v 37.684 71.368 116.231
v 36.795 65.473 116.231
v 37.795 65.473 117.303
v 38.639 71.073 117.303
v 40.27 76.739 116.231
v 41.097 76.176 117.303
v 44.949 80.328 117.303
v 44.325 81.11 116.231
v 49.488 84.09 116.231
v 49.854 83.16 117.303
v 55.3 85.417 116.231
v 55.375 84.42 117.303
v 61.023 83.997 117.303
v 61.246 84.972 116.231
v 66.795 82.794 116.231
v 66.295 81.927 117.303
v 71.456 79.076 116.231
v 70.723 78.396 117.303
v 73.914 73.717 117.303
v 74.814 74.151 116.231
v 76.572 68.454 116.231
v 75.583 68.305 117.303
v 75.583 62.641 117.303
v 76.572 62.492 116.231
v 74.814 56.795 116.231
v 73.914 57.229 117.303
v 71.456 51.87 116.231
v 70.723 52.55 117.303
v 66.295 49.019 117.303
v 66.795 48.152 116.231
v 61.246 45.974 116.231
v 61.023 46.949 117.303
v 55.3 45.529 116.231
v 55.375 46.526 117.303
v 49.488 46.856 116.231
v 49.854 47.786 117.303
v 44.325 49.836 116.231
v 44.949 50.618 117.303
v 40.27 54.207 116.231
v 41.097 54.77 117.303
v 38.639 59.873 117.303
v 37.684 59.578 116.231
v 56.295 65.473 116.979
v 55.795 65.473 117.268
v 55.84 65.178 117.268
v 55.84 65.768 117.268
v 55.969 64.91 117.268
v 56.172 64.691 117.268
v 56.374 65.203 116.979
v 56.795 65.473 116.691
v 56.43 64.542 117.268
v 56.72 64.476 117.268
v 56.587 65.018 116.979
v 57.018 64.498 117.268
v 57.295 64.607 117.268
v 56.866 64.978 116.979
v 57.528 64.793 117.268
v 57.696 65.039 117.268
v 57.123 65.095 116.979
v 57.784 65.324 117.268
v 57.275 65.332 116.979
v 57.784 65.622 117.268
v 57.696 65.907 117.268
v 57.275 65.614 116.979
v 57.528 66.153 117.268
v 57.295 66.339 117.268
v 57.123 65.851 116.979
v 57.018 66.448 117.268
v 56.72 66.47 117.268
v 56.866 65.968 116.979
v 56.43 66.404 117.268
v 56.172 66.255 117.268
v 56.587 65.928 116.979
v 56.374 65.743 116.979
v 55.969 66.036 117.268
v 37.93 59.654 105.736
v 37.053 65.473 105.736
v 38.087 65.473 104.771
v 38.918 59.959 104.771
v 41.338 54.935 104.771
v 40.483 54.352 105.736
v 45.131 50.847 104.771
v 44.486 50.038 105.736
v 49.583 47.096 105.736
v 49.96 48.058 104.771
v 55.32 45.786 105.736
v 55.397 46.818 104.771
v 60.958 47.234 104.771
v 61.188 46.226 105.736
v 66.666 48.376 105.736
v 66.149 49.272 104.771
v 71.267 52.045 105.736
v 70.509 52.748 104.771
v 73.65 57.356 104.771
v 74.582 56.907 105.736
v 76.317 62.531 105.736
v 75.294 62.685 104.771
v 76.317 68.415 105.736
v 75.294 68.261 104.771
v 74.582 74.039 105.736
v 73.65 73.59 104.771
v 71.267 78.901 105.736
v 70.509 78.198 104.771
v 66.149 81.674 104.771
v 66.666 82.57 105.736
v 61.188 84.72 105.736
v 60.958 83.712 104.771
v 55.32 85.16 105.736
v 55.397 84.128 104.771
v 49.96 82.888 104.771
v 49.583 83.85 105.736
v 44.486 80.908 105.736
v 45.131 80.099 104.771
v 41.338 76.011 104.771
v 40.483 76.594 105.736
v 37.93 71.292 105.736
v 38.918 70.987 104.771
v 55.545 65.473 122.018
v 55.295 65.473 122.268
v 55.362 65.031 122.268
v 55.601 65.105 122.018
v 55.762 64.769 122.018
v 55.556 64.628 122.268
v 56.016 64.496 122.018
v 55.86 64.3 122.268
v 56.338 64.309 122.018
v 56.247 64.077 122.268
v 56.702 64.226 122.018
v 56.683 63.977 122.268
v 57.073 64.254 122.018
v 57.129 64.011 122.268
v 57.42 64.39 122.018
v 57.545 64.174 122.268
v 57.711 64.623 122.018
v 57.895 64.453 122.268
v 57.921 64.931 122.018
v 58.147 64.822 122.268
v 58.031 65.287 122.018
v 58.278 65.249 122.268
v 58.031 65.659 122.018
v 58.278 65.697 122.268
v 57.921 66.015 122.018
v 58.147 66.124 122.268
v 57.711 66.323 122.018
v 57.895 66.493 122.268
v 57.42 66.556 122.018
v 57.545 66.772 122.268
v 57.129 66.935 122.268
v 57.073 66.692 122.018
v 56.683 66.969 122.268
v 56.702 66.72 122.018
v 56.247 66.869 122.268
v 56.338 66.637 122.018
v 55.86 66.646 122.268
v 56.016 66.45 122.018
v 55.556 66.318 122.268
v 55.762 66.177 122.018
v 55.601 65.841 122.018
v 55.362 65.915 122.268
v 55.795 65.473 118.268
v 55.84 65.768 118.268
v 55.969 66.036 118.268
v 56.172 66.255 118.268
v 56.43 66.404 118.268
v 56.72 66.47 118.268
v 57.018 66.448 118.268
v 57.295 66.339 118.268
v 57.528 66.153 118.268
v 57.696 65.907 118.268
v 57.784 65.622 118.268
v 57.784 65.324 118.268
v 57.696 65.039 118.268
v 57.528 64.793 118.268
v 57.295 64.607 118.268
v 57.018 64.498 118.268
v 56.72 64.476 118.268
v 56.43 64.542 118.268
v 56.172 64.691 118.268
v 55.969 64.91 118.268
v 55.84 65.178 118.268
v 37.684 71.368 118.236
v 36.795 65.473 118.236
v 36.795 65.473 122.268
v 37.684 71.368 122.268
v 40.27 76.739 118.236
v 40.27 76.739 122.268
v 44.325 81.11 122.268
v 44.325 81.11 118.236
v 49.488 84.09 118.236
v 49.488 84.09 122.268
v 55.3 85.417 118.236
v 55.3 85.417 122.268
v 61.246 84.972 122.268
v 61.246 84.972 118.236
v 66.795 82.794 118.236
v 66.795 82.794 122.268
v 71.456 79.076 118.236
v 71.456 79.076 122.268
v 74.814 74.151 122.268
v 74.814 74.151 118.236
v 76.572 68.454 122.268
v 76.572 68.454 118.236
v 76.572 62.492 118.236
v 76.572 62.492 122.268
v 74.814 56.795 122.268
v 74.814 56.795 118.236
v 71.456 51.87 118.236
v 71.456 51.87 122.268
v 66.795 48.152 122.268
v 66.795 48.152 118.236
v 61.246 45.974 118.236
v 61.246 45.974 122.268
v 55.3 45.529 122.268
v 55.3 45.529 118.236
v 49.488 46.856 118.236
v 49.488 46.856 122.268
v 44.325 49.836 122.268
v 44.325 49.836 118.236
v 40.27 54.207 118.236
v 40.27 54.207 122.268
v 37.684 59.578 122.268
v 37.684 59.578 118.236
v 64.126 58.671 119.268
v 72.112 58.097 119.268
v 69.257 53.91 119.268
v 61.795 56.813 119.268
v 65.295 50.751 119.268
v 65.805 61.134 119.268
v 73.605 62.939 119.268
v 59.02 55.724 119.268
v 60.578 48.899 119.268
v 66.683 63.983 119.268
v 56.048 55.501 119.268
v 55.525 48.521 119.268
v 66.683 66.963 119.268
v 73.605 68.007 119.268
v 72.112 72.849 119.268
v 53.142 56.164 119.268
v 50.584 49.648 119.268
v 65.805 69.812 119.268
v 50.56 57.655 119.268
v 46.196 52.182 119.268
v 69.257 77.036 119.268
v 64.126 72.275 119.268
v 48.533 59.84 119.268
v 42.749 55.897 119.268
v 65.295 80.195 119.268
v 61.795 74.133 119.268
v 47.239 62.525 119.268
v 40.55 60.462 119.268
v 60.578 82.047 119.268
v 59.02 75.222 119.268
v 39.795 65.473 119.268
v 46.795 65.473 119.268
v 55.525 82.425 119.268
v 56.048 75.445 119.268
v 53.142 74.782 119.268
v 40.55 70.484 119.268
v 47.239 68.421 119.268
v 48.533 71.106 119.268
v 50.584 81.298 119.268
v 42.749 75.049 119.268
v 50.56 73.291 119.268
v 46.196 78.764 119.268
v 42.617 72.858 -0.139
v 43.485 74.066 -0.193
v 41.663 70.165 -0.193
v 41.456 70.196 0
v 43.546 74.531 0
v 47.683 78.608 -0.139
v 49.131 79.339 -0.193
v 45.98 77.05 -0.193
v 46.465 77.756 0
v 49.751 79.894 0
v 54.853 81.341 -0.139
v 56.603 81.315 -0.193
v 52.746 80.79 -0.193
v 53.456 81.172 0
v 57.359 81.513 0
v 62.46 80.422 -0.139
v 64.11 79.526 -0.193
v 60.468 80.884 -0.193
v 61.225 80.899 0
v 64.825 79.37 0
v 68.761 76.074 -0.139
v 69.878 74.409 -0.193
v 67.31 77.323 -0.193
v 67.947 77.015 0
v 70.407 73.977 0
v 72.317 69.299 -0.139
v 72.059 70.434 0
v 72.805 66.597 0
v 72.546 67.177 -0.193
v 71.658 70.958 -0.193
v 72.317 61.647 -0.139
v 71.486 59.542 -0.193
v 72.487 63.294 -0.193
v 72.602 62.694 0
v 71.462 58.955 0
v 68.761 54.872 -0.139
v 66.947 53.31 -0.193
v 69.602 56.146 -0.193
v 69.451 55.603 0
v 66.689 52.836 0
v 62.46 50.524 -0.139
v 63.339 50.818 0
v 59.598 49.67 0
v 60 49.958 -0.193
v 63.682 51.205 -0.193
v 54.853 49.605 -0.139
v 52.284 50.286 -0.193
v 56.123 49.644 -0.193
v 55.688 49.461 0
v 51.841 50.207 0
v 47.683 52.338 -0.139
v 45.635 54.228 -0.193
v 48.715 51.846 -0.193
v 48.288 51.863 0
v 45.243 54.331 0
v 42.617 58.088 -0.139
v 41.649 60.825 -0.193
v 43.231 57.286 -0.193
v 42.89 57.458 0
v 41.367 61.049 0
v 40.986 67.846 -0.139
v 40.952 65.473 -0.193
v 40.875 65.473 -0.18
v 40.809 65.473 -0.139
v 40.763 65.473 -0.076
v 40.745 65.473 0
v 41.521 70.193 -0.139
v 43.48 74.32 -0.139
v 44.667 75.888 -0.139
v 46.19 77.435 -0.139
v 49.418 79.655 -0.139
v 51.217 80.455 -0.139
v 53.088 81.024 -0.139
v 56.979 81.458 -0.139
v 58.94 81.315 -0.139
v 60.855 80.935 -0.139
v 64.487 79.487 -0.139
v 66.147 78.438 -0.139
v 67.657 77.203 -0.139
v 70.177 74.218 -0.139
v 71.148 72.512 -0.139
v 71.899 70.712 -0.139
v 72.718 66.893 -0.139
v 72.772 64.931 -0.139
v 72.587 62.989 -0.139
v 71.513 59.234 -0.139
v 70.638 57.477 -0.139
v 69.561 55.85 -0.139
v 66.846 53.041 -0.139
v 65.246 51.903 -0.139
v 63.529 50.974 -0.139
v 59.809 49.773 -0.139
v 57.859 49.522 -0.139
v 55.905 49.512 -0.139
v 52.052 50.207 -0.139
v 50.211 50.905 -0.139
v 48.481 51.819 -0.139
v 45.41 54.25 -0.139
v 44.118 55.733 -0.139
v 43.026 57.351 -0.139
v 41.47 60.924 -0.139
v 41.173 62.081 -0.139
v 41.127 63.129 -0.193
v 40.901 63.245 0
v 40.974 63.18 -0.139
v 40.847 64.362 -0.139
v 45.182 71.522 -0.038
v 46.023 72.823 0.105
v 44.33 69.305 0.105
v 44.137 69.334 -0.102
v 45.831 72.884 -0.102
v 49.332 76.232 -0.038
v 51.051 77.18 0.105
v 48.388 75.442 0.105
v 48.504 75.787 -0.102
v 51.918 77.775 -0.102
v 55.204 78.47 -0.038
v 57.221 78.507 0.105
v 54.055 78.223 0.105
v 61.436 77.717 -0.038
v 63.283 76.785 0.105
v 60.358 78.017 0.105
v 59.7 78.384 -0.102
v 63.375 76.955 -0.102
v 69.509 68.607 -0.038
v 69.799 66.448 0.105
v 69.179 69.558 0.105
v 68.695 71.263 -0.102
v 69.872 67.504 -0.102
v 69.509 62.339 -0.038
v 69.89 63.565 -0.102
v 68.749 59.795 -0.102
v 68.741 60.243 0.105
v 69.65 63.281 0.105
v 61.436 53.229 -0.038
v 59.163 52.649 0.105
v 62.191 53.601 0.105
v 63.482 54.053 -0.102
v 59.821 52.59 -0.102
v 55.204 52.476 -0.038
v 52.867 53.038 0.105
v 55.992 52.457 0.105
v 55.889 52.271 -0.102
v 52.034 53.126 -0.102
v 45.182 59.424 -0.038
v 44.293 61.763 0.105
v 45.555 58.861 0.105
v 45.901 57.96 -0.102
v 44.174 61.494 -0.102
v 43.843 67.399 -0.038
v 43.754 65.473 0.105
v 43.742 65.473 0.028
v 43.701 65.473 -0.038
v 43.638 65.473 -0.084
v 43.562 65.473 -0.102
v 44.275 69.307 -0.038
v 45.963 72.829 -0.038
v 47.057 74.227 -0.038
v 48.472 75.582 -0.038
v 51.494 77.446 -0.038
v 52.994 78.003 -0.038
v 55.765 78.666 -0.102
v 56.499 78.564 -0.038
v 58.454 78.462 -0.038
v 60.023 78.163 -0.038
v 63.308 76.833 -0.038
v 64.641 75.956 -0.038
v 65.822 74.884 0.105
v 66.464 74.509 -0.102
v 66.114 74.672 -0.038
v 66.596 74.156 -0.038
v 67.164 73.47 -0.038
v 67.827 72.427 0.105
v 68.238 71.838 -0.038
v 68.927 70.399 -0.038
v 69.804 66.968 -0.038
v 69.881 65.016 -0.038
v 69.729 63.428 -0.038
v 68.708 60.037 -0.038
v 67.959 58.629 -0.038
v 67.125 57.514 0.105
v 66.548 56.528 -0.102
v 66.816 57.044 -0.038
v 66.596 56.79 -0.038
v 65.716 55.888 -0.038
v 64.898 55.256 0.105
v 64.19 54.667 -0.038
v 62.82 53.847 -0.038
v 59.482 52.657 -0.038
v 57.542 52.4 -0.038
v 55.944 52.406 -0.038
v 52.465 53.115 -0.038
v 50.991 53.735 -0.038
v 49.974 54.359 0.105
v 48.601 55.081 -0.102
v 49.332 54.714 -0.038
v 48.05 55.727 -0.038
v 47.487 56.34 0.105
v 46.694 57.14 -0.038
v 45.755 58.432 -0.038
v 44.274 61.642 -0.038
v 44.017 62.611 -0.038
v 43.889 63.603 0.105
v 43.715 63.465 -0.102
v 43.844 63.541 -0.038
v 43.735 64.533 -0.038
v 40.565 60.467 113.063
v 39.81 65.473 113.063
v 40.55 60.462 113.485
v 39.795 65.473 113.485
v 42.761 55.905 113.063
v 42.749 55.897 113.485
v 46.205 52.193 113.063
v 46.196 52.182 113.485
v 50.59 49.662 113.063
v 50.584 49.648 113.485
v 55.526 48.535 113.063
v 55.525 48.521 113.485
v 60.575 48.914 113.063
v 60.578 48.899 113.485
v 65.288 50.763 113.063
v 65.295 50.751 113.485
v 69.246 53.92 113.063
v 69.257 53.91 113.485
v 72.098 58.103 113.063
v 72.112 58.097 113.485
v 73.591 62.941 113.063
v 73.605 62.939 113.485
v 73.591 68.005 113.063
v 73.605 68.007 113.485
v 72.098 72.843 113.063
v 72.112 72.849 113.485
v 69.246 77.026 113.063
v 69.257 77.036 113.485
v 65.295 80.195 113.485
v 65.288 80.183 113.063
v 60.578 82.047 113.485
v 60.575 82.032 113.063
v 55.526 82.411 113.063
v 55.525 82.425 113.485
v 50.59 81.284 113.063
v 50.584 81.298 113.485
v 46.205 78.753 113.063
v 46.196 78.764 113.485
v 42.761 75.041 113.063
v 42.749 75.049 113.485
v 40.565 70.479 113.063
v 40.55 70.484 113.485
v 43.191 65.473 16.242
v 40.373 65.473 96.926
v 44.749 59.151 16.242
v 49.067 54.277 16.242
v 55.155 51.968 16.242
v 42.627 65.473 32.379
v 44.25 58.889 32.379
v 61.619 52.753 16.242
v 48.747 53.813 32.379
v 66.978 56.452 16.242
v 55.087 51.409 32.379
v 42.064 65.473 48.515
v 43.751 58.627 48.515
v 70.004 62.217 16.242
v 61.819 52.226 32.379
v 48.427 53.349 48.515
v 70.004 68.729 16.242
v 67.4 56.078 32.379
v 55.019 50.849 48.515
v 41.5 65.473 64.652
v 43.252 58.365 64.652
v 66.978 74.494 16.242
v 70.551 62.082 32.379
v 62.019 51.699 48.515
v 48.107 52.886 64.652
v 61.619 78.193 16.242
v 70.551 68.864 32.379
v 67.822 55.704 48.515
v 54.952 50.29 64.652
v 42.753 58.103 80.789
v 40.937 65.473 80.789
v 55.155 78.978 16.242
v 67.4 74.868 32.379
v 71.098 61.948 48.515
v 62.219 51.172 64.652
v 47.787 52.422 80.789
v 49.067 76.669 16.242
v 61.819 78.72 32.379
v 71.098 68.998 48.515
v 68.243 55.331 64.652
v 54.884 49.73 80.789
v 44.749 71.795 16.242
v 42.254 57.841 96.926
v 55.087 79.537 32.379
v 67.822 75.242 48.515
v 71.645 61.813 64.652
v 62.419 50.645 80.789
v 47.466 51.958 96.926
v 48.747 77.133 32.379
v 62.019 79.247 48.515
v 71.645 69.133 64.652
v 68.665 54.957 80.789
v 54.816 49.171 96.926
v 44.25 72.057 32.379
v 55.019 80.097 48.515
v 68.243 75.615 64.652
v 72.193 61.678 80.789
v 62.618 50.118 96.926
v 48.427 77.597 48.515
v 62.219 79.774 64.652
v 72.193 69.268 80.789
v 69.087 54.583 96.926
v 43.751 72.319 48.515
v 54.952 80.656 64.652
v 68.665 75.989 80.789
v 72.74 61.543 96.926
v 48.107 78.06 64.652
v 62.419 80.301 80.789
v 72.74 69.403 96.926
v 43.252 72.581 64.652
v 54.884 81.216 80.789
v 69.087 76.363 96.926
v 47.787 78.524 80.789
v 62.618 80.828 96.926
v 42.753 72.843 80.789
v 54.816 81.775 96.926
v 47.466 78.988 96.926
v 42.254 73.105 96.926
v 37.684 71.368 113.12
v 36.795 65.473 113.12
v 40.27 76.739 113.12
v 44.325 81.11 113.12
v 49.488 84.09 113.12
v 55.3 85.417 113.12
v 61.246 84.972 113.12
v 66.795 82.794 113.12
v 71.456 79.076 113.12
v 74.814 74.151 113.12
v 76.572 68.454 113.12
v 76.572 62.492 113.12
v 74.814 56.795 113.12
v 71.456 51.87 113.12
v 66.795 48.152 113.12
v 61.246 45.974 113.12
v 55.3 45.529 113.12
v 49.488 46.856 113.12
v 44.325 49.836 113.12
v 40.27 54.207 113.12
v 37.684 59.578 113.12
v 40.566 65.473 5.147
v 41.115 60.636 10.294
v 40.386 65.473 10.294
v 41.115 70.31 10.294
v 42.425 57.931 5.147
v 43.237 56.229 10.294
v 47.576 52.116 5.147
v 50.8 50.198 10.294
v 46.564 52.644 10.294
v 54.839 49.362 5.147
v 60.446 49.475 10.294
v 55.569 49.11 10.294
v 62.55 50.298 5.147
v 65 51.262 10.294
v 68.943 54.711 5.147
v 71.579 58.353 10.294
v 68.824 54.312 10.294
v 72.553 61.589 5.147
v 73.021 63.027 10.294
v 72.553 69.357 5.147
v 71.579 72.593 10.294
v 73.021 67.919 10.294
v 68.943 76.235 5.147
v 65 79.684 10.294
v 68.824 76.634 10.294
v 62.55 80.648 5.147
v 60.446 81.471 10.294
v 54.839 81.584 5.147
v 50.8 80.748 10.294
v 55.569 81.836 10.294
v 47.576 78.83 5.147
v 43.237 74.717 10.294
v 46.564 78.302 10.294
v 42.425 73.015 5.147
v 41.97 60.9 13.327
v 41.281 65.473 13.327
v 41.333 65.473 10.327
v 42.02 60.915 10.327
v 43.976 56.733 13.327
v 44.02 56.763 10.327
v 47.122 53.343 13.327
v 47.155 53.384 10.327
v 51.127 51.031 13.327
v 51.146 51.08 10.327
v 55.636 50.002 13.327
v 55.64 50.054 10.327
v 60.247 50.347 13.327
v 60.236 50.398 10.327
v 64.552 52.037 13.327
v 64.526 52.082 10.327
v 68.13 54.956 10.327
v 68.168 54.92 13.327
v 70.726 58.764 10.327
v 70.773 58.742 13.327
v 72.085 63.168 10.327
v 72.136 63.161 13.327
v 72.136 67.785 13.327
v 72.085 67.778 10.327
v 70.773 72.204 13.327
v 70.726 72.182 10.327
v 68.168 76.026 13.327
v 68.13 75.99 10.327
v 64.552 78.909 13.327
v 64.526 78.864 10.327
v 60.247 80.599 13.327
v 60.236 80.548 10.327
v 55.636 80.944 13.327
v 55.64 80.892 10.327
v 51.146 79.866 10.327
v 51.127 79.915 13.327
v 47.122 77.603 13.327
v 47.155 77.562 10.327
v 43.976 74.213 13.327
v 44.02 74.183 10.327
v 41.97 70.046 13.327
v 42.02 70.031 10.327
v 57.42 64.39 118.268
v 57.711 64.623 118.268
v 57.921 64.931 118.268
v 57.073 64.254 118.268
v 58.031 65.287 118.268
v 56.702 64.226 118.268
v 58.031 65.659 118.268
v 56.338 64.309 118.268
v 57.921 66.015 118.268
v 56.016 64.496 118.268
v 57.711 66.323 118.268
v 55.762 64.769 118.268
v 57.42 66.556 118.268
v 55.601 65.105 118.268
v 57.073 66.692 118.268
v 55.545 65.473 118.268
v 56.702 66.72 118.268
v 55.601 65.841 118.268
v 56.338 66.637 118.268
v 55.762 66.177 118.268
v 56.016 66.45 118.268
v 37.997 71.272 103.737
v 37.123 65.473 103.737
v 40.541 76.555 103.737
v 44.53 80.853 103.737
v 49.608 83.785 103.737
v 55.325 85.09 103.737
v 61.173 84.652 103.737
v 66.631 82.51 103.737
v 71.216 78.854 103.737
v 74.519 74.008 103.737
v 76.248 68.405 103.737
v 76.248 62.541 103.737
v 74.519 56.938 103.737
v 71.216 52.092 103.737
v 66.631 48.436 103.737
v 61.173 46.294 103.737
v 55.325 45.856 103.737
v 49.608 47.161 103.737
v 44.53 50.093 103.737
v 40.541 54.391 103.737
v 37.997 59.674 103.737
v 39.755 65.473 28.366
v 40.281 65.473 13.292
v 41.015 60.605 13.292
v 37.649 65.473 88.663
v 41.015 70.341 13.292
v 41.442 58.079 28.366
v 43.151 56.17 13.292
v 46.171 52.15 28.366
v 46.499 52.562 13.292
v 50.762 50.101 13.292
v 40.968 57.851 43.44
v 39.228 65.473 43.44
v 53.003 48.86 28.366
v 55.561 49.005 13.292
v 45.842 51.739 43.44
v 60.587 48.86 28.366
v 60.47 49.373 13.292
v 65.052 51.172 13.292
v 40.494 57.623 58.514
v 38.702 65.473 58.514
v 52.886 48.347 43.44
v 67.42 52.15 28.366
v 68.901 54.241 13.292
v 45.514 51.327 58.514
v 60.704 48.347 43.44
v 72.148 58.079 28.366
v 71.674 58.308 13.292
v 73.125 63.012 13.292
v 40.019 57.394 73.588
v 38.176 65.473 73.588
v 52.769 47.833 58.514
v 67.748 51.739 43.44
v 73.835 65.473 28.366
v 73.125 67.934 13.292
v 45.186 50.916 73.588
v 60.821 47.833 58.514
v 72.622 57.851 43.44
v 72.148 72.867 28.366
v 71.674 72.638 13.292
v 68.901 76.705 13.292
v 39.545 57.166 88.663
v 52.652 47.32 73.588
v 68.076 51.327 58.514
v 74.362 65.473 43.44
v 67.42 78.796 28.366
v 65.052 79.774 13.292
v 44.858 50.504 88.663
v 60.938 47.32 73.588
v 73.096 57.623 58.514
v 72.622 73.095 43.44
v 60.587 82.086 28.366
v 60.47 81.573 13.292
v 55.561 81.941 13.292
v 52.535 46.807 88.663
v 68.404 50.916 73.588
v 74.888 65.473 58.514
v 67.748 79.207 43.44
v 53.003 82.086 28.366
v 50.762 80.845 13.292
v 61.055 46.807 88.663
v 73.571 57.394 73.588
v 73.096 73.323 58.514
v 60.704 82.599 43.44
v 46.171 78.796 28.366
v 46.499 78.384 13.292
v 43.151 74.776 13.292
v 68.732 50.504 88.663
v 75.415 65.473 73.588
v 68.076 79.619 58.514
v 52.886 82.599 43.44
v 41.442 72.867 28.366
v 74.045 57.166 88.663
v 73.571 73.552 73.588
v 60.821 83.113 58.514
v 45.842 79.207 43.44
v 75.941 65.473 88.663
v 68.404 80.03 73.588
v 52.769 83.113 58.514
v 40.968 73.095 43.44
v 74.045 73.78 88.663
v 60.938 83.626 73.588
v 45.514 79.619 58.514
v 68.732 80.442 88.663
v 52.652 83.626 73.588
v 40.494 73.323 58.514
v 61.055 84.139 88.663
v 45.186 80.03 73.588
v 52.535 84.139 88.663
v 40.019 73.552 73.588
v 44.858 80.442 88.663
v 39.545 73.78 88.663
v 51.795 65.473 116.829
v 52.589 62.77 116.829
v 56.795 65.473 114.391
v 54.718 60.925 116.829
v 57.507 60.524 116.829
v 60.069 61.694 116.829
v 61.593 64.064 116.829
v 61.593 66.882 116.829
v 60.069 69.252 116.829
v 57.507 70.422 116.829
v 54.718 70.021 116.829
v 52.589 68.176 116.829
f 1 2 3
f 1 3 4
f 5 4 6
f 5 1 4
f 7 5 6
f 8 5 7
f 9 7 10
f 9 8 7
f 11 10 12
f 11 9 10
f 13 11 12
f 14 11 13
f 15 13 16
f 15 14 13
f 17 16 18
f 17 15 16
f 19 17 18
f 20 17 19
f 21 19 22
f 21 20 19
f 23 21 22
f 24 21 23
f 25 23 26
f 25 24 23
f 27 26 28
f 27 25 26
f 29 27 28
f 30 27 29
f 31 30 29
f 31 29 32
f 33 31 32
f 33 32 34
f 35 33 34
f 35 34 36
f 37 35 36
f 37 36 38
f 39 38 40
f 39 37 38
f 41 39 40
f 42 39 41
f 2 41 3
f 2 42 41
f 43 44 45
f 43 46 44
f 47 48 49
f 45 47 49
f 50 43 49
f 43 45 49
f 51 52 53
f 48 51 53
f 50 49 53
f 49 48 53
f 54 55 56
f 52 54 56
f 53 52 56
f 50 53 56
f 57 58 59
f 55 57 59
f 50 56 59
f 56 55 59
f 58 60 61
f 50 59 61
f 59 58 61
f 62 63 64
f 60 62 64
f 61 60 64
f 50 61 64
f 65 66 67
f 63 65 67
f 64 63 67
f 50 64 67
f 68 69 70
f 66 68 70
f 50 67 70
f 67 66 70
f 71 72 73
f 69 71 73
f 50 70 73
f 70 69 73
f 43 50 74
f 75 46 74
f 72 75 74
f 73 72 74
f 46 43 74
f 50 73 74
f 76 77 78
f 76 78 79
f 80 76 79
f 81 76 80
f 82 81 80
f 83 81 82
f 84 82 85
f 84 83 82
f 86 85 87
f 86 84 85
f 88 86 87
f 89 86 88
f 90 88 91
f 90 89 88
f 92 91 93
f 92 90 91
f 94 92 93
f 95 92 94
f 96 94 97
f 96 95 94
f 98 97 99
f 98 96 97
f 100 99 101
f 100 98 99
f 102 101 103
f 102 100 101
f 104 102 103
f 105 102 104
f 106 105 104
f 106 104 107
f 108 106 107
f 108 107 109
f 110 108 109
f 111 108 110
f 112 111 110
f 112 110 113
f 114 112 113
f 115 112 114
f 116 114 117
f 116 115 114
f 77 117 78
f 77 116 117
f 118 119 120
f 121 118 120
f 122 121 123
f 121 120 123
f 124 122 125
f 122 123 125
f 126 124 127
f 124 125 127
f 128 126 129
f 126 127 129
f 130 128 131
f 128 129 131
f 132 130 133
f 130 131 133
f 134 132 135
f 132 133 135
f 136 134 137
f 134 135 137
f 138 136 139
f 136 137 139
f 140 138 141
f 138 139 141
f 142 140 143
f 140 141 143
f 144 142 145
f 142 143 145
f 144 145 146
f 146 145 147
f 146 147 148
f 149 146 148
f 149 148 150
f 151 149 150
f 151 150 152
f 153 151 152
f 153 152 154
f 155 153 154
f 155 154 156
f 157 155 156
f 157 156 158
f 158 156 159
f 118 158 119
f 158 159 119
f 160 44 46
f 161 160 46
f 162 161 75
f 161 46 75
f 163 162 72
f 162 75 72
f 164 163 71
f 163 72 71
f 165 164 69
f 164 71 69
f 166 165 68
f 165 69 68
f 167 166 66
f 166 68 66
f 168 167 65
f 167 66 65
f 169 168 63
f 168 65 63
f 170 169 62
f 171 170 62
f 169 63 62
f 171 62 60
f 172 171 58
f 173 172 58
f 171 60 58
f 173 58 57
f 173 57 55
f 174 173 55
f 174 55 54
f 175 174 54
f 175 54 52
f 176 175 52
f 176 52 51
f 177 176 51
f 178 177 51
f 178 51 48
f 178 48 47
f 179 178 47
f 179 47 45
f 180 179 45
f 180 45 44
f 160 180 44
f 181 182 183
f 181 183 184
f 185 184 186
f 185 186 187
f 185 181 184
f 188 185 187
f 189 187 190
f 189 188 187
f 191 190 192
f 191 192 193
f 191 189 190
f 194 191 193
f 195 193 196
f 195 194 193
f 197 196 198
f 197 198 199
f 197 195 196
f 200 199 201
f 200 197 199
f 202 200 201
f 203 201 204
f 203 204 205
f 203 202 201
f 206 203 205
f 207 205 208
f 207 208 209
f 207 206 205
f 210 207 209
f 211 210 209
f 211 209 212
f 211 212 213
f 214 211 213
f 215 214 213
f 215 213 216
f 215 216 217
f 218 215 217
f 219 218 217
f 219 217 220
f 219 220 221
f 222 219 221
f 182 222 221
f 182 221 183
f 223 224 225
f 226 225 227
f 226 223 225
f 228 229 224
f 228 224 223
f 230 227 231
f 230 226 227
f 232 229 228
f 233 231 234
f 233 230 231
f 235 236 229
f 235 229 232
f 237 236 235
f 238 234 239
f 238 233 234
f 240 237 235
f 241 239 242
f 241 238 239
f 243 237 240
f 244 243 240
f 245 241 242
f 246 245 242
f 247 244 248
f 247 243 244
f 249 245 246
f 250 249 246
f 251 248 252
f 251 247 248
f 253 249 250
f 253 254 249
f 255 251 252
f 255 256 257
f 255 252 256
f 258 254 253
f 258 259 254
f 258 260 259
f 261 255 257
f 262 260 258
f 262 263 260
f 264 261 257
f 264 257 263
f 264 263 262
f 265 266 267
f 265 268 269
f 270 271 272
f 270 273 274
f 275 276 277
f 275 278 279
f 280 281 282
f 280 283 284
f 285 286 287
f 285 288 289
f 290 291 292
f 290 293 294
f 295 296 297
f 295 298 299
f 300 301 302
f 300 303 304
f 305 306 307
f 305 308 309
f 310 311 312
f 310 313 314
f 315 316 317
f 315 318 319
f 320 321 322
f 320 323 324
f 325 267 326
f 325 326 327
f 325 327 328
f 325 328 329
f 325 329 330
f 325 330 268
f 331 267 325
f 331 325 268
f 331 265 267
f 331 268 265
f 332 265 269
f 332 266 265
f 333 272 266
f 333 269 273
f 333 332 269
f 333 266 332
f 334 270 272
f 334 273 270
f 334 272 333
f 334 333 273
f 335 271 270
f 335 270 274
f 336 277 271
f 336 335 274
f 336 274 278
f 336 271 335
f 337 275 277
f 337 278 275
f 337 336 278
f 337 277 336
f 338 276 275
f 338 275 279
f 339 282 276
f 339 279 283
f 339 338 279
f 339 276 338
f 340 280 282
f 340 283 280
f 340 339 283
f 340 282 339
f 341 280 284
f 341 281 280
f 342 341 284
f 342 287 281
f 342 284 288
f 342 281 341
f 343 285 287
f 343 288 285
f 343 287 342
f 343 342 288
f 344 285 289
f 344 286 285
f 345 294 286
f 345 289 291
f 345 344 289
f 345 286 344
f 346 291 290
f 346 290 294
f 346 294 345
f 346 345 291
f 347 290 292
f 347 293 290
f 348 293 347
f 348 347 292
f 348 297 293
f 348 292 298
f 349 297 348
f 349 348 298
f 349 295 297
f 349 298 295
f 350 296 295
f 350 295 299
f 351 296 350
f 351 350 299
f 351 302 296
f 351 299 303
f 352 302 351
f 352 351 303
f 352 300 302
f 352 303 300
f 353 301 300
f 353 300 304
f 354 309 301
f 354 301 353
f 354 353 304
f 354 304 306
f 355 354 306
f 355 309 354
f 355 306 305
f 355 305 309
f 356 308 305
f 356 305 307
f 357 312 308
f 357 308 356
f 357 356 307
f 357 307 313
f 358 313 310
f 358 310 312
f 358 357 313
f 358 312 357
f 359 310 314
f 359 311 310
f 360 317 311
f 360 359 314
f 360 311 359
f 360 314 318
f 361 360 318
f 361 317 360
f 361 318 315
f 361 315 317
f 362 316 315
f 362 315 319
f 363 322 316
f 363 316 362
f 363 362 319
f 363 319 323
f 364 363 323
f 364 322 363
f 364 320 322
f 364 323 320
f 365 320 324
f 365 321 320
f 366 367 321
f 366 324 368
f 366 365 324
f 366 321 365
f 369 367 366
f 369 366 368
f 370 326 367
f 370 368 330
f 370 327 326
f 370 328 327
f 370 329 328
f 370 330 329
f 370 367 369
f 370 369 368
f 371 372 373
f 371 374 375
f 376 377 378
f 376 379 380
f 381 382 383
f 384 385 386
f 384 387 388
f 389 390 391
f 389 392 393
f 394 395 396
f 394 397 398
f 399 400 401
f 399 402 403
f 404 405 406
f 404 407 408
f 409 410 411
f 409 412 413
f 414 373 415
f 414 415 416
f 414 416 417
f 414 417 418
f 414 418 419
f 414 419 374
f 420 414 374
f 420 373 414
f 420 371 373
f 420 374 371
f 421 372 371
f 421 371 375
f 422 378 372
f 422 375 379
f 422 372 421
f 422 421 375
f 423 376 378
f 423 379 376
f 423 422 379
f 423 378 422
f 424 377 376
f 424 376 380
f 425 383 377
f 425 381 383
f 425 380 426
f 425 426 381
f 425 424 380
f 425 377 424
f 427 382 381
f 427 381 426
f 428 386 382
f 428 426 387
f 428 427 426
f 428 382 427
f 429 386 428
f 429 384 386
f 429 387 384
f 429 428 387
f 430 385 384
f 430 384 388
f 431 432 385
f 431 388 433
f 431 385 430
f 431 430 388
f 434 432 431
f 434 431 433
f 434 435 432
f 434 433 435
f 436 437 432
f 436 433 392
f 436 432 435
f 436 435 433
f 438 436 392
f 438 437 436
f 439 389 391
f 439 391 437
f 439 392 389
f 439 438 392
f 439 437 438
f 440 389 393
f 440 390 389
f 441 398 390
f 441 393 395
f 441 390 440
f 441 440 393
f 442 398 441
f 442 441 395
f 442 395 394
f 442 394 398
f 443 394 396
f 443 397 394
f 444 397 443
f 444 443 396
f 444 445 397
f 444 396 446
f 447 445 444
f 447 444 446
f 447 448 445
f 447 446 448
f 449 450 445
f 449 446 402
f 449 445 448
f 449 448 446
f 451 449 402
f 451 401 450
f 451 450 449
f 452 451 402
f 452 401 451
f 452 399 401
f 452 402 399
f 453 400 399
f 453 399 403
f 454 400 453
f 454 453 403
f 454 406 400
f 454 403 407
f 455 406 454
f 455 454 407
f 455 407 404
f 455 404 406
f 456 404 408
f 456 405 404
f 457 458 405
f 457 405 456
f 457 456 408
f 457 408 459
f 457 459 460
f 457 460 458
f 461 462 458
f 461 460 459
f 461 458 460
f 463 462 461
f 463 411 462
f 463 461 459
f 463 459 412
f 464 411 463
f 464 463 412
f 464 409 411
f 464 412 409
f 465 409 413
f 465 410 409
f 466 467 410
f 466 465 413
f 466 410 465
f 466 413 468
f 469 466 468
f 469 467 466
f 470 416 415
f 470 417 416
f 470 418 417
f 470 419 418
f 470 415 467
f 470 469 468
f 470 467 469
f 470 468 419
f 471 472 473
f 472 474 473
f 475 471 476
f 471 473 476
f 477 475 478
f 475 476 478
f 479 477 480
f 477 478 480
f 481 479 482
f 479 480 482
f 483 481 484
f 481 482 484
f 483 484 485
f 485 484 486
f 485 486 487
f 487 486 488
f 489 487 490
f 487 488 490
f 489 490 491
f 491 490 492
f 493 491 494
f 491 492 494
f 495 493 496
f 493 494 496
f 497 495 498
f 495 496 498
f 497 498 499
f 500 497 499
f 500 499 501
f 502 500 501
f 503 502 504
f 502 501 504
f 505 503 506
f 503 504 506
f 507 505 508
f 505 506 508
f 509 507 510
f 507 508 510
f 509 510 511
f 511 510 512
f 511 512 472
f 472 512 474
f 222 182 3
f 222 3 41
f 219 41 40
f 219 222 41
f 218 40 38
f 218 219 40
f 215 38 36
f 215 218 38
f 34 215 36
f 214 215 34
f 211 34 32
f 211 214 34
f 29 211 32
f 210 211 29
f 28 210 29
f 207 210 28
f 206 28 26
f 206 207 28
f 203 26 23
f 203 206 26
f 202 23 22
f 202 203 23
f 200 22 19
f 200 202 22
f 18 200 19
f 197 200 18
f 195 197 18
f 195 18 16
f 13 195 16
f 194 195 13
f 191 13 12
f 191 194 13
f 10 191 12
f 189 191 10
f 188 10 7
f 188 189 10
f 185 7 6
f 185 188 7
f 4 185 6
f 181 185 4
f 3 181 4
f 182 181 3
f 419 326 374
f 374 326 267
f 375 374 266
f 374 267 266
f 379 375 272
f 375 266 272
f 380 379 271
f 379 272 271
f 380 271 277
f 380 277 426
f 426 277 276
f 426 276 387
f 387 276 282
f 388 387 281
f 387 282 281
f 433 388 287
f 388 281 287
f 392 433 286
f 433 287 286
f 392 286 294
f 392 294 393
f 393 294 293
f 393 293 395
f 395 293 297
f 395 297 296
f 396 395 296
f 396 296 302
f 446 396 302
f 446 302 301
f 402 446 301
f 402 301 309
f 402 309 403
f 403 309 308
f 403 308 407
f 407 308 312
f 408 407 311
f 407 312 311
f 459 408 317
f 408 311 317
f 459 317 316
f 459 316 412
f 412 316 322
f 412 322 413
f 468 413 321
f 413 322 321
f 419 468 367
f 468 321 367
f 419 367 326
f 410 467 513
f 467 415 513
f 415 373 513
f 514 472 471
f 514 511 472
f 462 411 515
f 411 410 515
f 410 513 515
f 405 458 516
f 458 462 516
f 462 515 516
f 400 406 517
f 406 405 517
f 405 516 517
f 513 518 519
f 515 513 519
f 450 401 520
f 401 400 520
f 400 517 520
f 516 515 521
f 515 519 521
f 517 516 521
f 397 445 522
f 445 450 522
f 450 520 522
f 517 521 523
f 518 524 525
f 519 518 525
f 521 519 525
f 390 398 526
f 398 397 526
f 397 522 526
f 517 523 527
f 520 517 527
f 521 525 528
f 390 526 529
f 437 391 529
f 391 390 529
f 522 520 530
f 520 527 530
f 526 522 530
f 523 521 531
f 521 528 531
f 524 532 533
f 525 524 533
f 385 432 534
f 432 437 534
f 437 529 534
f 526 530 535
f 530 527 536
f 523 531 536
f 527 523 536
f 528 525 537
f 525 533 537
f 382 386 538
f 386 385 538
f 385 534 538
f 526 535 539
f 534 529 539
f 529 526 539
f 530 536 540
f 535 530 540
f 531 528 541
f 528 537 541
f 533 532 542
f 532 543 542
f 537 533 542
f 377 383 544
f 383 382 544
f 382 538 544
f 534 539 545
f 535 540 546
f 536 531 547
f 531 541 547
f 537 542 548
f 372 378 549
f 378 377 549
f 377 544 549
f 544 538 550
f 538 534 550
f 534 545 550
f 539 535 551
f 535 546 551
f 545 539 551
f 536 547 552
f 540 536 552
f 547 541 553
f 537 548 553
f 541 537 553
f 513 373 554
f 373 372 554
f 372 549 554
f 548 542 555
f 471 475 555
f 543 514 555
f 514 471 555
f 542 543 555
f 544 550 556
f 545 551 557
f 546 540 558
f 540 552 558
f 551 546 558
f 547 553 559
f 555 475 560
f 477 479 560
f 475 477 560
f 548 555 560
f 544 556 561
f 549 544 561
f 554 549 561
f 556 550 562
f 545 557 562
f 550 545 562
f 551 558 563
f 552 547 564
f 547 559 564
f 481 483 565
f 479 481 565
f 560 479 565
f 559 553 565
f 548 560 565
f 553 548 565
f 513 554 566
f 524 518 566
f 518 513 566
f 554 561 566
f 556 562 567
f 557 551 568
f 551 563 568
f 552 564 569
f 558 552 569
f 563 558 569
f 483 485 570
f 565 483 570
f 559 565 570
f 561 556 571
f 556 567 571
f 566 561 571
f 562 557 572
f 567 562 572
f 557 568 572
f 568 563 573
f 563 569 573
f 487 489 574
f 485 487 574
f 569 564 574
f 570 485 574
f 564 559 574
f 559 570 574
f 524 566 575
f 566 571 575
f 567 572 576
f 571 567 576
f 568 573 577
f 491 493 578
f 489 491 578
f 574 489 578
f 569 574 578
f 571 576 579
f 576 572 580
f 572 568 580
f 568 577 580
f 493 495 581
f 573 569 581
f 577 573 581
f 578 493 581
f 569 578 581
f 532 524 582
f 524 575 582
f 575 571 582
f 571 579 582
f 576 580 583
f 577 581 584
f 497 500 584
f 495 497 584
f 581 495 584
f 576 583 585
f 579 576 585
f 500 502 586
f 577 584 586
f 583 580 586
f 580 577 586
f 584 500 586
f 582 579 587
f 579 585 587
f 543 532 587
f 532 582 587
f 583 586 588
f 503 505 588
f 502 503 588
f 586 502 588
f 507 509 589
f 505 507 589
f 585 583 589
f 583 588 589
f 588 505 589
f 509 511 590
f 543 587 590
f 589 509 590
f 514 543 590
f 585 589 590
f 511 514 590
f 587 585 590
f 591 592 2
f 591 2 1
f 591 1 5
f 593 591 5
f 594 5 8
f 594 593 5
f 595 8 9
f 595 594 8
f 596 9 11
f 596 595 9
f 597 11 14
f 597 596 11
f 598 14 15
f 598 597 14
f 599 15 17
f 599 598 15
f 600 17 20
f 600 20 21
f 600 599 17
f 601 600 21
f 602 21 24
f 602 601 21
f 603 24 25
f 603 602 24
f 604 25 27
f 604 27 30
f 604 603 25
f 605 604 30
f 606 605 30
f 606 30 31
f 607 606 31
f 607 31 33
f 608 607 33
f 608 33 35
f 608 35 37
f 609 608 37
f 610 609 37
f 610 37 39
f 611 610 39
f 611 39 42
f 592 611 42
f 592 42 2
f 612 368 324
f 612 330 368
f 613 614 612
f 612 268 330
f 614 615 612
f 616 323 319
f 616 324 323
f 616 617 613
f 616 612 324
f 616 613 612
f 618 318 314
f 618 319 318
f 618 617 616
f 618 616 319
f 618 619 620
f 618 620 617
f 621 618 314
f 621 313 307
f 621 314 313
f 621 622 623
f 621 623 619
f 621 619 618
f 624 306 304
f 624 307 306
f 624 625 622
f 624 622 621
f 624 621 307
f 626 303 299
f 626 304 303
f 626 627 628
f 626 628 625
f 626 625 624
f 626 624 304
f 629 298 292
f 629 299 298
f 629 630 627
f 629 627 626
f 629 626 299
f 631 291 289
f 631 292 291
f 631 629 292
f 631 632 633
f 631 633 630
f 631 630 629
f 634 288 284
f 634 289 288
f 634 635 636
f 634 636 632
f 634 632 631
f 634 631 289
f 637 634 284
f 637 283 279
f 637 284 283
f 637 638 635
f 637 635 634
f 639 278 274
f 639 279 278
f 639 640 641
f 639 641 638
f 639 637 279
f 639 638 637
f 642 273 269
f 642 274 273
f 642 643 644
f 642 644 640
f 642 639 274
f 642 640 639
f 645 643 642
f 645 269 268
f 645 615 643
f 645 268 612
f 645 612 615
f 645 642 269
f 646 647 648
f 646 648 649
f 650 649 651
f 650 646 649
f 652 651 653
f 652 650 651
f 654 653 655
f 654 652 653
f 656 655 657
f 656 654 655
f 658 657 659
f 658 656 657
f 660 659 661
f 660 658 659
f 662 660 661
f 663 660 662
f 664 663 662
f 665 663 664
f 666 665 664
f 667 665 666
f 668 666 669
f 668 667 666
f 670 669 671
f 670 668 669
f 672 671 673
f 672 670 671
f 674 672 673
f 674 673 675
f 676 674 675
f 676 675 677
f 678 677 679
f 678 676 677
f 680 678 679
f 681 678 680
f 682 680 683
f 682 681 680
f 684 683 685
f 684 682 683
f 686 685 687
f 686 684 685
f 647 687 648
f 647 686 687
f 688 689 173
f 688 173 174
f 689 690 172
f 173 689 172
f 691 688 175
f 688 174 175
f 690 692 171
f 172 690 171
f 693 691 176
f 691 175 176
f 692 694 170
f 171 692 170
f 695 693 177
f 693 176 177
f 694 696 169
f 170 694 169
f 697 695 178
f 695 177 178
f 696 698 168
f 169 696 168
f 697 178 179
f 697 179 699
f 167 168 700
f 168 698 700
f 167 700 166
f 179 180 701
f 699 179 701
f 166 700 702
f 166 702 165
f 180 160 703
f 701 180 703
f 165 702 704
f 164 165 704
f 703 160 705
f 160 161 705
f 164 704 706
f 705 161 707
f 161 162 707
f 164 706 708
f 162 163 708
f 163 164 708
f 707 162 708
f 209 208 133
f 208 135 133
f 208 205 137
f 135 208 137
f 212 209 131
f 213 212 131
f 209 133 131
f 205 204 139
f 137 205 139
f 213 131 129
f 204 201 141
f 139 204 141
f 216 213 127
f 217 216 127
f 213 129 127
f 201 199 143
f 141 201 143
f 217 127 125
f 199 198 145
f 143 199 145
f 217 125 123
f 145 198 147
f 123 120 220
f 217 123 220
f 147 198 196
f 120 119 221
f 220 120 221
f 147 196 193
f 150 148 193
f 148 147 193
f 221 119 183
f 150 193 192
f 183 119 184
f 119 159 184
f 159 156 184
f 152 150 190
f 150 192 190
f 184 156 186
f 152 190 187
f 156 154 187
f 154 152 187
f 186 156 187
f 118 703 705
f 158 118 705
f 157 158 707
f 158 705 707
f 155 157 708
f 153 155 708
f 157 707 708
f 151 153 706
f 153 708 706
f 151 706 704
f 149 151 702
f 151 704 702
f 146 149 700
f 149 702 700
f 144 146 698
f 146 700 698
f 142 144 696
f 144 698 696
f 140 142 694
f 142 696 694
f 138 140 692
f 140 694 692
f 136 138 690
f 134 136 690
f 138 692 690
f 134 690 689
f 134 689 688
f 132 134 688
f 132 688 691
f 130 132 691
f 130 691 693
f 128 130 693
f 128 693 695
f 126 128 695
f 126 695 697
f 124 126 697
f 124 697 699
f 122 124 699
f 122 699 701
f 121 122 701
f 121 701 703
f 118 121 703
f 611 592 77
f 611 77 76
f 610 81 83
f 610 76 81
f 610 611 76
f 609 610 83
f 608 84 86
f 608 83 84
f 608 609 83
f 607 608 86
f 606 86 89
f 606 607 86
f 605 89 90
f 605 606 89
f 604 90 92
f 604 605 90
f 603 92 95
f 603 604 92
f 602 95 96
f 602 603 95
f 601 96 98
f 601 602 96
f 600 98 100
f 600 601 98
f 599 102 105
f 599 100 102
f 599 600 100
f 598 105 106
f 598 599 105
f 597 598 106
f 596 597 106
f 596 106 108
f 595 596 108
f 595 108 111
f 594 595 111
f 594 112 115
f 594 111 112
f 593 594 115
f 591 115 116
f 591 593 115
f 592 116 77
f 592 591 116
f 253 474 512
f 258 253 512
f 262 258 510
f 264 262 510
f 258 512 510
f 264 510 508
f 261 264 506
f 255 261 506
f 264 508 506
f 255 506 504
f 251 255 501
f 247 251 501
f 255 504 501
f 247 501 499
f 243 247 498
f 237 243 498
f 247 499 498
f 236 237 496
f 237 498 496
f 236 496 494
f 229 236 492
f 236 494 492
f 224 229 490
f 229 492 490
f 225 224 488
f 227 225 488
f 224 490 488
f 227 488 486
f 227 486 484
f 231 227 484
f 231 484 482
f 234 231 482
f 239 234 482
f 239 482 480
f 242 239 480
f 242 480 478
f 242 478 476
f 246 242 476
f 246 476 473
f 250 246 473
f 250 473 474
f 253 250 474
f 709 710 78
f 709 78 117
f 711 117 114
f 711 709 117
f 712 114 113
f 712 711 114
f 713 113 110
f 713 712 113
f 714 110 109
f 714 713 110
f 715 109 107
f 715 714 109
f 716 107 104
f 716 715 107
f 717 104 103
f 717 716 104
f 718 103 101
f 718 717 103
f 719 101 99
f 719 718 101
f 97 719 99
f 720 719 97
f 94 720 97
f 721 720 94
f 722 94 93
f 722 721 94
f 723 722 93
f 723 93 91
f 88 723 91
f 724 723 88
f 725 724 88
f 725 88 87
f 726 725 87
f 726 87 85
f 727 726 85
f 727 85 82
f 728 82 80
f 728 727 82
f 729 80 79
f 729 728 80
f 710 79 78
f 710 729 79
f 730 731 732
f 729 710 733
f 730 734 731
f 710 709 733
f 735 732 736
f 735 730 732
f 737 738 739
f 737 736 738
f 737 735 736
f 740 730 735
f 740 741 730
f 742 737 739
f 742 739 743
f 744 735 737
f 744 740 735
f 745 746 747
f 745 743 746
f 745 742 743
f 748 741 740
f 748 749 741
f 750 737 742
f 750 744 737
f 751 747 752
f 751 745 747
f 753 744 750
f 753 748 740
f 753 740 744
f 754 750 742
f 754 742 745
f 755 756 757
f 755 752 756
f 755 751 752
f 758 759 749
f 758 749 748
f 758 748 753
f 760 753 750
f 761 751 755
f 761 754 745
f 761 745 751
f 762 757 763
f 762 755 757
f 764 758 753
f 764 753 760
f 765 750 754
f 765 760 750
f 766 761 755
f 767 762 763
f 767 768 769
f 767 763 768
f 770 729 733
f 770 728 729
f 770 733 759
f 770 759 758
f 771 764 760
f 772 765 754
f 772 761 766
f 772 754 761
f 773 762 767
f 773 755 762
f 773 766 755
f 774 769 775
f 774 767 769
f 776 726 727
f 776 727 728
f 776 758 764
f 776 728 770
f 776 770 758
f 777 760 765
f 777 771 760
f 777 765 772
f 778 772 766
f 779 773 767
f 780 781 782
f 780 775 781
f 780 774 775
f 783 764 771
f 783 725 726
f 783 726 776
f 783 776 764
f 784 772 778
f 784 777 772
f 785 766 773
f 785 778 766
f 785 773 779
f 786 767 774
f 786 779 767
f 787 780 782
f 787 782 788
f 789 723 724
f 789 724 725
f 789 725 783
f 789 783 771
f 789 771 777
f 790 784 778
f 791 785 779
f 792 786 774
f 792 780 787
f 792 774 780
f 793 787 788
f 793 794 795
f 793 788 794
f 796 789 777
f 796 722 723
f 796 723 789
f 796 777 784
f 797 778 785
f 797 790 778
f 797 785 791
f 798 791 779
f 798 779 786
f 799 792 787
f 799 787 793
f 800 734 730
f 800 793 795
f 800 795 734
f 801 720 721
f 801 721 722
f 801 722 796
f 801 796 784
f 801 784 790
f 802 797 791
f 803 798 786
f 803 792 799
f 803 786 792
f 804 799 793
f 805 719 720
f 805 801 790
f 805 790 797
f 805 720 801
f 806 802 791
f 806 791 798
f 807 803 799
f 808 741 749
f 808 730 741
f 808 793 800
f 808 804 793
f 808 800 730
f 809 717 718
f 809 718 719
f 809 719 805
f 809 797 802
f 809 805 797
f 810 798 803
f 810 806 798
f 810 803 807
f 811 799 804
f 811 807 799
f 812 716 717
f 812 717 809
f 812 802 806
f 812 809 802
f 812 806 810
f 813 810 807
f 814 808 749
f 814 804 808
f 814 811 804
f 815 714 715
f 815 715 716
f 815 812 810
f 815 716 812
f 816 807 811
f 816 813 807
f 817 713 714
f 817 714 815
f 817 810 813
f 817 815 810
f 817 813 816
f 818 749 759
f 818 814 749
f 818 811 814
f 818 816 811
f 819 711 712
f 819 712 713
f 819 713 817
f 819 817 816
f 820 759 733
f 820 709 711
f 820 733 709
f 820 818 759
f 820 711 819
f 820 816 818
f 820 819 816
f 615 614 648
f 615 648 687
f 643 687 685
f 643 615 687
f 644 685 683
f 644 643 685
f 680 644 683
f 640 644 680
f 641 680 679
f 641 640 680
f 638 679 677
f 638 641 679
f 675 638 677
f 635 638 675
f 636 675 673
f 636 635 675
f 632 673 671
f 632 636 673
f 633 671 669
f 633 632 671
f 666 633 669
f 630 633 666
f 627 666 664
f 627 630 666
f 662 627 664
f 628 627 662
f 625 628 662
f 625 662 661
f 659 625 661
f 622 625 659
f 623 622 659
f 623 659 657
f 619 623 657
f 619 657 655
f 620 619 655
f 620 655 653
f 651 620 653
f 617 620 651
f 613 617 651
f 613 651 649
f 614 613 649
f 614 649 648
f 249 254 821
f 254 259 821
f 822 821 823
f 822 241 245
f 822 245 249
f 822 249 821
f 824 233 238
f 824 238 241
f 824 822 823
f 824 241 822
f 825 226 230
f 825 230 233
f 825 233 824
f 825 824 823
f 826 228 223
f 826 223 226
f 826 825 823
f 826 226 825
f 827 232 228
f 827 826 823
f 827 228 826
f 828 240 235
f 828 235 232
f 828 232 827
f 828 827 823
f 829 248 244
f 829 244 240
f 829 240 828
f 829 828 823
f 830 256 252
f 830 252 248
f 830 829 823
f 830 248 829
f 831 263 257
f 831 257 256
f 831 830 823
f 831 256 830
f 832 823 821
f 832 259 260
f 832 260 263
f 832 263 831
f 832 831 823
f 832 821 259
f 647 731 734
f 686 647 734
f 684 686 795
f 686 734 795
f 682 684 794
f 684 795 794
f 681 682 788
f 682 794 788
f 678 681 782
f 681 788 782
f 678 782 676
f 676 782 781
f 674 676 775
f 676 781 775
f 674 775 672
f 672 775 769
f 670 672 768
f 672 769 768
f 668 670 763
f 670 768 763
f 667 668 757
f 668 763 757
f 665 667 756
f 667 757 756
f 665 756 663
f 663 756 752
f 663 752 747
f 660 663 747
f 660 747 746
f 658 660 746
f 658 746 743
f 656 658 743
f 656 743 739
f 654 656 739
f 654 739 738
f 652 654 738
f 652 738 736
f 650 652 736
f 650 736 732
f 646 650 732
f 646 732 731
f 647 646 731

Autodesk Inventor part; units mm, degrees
ref_plane "YZ Plane" through (0, 0, 0) normal (1, 0, 0) x (0, 1, 0)
ref_plane "XZ Plane" through (0, 0, 0) normal (0, 1, 0) x (-1, 0, 0)
ref_plane "XY Plane" through (0, 0, 0) normal (0, 0, 1) x (1, 0, 0)
sketch "Sketch1" plane through (0, 0, 0) normal (1, 0, 0) x (0, 1, 0)
  line L0 (-20, 0) -> (122.468, 0)
  line L1 (0, 0) -> (0, -20)
  line L2 (0, -20) -> (9.148, -20)
  line L3 (9.148, -20) -> (122.468, -16.0428)
  line L4 (122.468, 0) -> (122.468, -16.0428)
  line L5 (3, -10) -> (3, -17)
  line L6 (7.8773, 0) -> (3, -10)
  line L7 (7.8773, 0) -> (19.0033, 0) construction
  line L8 (9.2055, 0) -> (9.2055, -16.9852)
  line L9 (8.783, -17) -> (122.468, -13.03)
  line L10 (3, -17) -> (8.783, -17)
  line L11 (122.468, -16.0428) -> (122.3629, -13.0337)
  line L12 (6.0374, -20) -> (4.9651, -19)
  line L13 (4.9651, -19) -> (4.0326, -20)
  line L14 (4.9651, -19) -> (5, -20)
  line L15 (17.532, -19.7072) -> (17.4971, -18.7078)
  line L16 (17.4971, -18.7078) -> (18.5314, -19.6723)
  line L17 (17.4971, -18.7078) -> (16.5326, -19.7421)
  line L18 (111.974, -16.4092) -> (108.9762, -16.5139)
  line L19 (108.9762, -16.5139) -> (108.9413, -15.5145)
  line L20 (108.9413, -15.5145) -> (111.9409, -15.4622)
  line L21 (111.9409, -15.4622) -> (111.974, -16.4092)
  line L22 (0.5, 0) -> (0.5, -1)
  line L23 (0, -1.5) -> (0.5, -1)
  line L24 (0.5, -1) -> (5, -1)
  line L25 (5, -1) -> (5.5774, 0)
  line L26 (0.25, -1.25) -> (4, -1.25)
  line L27 (4, -1.25) -> (4, 0)
  point P0 (4, -1)
  dimension "d1" = 20
  dimension "d5" = 3
  dimension "d18" = 90
  dimension "d22" = 5
  dimension "d23" = 1
  dimension "d24" = 1
  dimension "d25" = 105
  dimension "d26" = 3
  dimension "d27" = 1
  dimension "d28" = 13.5
  dimension "d43" = 88
revolve "Revolution1" add sketch "Sketch1" angle 360 about axis through (0, -20, 0) along (0, 1, 0) contours L23 L26 L27 L24 L25 L0 L6 L5 L10 L9 L11 L3 L21 L20 L19 L16 L17 L2 L12 L13 L1
fillet "Fillet1" radius 0.2 2 edges at (0, 122.468, 16.0428) (0, 122.3629, 13.0337)
thread "Thread2" size "M2.5x0.45" class "6H" standard "ANSI Metric M Profile" length 3.5
move or copy body "Поворот1" bodies to move or copy 1 copy no rotation origin (0, 0, 0) rotation axis (0, 0, 1) rotation angle -90 translate (-65.473, 65.473, 0)
move or copy body "Поворот2" bodies to move or copy 1 copy no rotation origin (0, 0, 0) rotation axis (0, 1, 0) rotation angle 90 translate (56.7951, 0, 56.7951)
properties material "Aluminum 2014-T6"
